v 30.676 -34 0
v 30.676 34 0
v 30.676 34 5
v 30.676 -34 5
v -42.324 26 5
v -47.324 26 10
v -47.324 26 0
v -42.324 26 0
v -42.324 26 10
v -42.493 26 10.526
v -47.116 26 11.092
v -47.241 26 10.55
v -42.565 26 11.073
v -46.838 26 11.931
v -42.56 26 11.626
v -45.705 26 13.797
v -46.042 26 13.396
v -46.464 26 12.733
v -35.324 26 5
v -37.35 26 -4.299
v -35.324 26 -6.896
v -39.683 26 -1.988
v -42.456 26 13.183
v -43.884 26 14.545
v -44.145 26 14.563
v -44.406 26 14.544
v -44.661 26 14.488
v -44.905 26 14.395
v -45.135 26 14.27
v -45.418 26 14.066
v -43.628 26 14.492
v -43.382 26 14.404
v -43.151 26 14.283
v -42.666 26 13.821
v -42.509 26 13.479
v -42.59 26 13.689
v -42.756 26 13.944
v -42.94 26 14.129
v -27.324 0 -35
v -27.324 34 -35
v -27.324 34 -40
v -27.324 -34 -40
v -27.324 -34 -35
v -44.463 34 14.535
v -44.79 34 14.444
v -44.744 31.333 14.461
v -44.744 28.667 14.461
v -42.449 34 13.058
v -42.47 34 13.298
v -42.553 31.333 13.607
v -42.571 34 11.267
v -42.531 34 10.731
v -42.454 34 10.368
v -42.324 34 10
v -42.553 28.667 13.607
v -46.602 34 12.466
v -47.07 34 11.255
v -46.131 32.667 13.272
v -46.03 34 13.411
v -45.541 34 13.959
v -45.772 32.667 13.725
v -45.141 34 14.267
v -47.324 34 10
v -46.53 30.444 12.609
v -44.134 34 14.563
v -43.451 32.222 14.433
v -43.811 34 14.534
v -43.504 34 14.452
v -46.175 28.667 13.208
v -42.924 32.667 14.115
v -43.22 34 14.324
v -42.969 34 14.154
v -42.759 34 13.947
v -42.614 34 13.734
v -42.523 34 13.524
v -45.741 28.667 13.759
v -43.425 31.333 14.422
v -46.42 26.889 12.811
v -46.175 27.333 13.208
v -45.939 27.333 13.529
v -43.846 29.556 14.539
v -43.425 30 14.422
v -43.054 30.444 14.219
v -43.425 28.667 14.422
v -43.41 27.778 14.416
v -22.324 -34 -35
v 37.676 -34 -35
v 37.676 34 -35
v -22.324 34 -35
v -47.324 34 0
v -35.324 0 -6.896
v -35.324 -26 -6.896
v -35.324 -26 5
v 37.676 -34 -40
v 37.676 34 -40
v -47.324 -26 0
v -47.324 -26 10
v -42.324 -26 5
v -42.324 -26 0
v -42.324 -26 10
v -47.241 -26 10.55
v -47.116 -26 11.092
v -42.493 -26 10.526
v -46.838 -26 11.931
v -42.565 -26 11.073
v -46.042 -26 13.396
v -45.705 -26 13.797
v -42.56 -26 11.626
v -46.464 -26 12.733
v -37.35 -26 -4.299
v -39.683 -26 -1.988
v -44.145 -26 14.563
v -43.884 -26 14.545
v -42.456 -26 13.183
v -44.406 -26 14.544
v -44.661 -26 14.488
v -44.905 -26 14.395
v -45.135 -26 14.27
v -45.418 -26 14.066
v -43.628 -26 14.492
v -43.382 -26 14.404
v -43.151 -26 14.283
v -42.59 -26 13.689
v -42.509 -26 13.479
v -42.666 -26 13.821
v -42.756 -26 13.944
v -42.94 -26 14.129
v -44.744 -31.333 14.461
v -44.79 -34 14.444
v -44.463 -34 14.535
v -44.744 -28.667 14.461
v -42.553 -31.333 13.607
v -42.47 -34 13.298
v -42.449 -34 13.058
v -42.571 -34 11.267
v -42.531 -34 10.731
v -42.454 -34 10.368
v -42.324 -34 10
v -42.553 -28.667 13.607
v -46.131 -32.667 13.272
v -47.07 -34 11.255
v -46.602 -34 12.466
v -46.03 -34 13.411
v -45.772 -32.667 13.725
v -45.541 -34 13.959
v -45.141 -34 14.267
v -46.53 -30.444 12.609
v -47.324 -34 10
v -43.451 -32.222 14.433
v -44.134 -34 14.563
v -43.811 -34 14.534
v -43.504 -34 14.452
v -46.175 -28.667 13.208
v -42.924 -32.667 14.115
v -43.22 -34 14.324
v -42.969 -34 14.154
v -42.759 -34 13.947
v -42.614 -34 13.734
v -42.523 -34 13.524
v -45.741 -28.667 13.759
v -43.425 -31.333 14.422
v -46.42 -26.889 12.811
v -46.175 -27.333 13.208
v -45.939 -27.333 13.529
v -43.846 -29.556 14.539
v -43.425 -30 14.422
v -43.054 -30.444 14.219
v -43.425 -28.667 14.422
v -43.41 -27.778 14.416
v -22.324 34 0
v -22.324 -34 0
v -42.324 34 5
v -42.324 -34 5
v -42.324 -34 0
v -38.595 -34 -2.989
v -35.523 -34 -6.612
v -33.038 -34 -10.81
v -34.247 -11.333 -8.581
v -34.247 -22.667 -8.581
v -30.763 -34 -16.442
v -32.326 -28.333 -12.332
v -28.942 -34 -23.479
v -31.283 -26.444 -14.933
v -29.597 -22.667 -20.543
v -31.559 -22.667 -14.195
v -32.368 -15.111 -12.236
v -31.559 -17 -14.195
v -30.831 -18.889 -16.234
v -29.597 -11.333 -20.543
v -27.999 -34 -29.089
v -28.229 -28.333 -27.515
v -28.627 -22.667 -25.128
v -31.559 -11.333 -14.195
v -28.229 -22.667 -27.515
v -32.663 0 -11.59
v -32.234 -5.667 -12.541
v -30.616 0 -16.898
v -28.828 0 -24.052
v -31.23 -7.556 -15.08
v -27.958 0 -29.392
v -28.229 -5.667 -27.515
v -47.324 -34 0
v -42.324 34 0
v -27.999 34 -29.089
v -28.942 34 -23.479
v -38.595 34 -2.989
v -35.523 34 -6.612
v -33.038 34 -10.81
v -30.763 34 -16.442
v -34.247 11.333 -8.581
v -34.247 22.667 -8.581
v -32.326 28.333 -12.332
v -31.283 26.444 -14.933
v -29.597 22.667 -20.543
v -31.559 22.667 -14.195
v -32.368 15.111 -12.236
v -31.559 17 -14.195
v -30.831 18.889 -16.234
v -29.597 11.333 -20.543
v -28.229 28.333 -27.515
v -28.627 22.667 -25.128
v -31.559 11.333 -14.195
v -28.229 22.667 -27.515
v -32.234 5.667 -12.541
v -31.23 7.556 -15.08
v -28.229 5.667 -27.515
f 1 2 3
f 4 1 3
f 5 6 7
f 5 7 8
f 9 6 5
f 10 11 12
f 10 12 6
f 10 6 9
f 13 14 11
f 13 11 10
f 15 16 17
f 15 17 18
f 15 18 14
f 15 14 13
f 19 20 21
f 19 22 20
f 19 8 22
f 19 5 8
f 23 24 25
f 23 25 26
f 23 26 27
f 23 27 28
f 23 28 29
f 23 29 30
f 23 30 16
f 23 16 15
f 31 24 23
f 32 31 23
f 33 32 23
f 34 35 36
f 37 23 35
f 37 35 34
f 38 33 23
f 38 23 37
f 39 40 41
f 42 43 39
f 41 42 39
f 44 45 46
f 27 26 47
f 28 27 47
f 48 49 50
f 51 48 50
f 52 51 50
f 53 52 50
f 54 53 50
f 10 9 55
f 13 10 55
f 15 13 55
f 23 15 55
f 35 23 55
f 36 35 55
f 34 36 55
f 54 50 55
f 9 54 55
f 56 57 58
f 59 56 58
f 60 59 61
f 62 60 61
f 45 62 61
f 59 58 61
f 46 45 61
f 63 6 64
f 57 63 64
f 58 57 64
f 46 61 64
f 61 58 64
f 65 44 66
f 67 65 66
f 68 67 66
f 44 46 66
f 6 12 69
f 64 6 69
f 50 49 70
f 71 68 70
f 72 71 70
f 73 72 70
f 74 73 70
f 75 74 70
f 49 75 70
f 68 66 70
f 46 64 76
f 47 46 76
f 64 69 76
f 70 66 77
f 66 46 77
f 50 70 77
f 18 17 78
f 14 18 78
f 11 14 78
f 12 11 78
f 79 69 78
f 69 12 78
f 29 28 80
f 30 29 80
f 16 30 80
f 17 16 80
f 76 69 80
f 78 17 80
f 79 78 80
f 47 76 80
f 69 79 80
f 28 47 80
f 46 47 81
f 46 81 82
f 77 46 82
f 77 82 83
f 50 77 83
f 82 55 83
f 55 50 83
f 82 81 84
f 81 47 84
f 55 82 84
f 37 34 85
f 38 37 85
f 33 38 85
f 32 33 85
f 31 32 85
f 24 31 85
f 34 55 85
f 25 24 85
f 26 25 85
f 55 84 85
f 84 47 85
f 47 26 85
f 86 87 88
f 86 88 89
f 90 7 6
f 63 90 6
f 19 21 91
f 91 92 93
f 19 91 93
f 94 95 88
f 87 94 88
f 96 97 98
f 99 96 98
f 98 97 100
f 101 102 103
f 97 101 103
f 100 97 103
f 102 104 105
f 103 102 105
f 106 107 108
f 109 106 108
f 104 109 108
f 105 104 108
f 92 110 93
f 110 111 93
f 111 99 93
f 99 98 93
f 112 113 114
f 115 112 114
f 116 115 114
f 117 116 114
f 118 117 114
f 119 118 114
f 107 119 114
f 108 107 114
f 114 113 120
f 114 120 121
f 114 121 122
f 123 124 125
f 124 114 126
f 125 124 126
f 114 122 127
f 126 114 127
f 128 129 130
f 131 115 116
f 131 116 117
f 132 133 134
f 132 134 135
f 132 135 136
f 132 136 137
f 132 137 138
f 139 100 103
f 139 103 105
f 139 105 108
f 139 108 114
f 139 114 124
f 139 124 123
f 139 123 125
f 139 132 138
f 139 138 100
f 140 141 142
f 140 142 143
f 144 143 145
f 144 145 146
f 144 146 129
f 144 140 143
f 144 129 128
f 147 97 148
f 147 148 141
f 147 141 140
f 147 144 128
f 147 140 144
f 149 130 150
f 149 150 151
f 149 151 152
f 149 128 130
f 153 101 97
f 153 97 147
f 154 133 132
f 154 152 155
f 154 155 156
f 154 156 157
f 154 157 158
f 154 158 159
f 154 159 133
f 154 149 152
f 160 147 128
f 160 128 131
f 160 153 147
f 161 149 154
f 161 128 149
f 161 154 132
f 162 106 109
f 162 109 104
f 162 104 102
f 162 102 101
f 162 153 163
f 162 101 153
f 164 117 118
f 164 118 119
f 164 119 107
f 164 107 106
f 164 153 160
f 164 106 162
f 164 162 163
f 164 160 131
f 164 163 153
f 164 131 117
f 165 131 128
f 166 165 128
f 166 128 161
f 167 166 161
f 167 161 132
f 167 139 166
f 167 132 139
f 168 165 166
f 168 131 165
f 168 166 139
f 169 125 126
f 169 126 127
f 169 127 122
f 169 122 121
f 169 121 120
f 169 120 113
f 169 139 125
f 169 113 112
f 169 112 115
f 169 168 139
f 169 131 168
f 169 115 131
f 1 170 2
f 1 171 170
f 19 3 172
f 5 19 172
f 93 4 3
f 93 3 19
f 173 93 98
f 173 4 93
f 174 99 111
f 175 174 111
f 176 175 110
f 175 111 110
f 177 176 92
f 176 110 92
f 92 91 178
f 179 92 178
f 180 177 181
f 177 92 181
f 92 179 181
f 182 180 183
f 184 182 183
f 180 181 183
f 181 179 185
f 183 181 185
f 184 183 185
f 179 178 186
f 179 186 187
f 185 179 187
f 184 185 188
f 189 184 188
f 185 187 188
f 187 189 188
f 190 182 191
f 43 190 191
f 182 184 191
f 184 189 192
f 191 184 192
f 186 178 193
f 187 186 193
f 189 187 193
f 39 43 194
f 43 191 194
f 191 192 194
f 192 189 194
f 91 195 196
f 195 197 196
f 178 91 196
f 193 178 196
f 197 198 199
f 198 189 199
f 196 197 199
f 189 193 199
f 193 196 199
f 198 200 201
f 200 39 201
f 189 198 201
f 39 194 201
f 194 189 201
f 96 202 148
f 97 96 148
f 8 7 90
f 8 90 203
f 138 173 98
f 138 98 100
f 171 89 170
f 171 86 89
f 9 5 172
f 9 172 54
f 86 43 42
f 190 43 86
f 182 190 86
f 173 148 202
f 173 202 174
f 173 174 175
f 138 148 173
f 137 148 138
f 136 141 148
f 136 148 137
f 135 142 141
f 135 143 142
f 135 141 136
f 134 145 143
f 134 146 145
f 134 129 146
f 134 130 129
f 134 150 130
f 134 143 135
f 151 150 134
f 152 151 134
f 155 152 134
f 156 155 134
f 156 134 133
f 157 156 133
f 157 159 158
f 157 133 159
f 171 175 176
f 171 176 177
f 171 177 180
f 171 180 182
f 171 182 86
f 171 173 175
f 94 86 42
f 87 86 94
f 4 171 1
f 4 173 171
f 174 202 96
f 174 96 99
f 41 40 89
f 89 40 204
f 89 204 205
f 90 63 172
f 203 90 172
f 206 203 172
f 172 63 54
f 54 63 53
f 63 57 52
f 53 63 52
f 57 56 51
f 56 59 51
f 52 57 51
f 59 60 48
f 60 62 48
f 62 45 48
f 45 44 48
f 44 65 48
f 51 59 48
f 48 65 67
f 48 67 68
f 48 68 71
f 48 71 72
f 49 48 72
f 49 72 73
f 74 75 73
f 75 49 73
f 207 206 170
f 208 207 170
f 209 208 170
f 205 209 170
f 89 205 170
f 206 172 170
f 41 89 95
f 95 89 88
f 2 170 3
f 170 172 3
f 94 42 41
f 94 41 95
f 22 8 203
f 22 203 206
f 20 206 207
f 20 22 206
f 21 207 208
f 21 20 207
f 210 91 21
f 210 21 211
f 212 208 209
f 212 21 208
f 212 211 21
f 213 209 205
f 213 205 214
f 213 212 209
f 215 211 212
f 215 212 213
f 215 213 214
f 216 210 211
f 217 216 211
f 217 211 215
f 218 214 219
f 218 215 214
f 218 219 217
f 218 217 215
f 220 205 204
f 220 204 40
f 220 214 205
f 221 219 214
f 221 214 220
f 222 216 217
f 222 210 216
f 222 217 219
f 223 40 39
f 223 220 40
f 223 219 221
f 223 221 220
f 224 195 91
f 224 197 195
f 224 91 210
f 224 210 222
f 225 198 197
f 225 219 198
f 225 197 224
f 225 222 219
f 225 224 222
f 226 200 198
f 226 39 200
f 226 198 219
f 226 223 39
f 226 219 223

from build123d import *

# Parameters (mm, degrees)
F0_W     = 15
F0_H     = 5
F0_W_2   = 5
F0_H_2   = 35
F1_DEPTH = 34
F2_W     = 5
F2_H     = 10
F3_DEPTH = 34
F4_W     = 16.2579220422
F4_H     = 42.7319623083
F5_DEPTH = 26


with BuildPart() as f1:
    # F0 (on Front) → F1 (new body, symmetric)
    with BuildSketch(Plane.XZ):
        Polygon((-22.3241779208, 0), (30.6758220792, 0), (30.6758220792, 5), (-27.3241779208, 5), (-27.3241779208, 0), align=None)
        with Locations((-34.8241779208, 2.5)):
            Rectangle(F0_W, F0_H)
        with BuildLine():
            Line((-27.3241779208, -35), (-27.3241779208, 0))
            Line((-27.3241779208, 0), (-42.3241779208, 0))
            add(Edge.make_bspline(
                [(-42.3241779208, 0), (-32.1847312152, -6.594858598), (-28.7573114038, -19.590485841), (-27.3241779208, -35)],
                knots=[0, 0, 0, 0, 38.0788655293, 38.0788655293, 38.0788655293, 38.0788655293], degree=3))
        make_face()
        with Locations((-24.8241779208, -17.5)):
            Rectangle(F0_W_2, F0_H_2)
        Polygon((37.6758220792, -35), (-22.3241779208, -35), (-27.3241779208, -35), (-27.3241779208, -40), (37.6758220792, -40), align=None)
    extrude(amount=F1_DEPTH, both=True)

    # F2 (on Front) → F3 (join, symmetric)
    with BuildSketch(Plane.XZ):
        with Locations((-44.8241779208, 5)):
            Rectangle(F2_W, F2_H)
        with BuildLine():
            Line((-47.3241779208, 10), (-42.3241779208, 10))
            add(Edge.make_bspline(
                [(-47.3241779208, 10), (-47.1237004262, 11.8566387437), (-45.3455906765, 15.4385356924), (-41.5967992059, 13.7724758931), (-42.9261420784, 11.4005931192), (-42.3241779208, 10)],
                knots=[0, 0, 0, 0, 0.3979300769, 0.66673524, 1, 1, 1, 1], degree=3))
        make_face()
    extrude(amount=F3_DEPTH, both=True)

    # F4 (on Front) → F5 (cut, symmetric)
    with BuildSketch(Plane.XZ):
        with Locations((-43.4531389419, 0.3948621452)):
            Rectangle(F4_W, F4_H)
    extrude(amount=F5_DEPTH, both=True, mode=Mode.SUBTRACT)


solid = f1.part
